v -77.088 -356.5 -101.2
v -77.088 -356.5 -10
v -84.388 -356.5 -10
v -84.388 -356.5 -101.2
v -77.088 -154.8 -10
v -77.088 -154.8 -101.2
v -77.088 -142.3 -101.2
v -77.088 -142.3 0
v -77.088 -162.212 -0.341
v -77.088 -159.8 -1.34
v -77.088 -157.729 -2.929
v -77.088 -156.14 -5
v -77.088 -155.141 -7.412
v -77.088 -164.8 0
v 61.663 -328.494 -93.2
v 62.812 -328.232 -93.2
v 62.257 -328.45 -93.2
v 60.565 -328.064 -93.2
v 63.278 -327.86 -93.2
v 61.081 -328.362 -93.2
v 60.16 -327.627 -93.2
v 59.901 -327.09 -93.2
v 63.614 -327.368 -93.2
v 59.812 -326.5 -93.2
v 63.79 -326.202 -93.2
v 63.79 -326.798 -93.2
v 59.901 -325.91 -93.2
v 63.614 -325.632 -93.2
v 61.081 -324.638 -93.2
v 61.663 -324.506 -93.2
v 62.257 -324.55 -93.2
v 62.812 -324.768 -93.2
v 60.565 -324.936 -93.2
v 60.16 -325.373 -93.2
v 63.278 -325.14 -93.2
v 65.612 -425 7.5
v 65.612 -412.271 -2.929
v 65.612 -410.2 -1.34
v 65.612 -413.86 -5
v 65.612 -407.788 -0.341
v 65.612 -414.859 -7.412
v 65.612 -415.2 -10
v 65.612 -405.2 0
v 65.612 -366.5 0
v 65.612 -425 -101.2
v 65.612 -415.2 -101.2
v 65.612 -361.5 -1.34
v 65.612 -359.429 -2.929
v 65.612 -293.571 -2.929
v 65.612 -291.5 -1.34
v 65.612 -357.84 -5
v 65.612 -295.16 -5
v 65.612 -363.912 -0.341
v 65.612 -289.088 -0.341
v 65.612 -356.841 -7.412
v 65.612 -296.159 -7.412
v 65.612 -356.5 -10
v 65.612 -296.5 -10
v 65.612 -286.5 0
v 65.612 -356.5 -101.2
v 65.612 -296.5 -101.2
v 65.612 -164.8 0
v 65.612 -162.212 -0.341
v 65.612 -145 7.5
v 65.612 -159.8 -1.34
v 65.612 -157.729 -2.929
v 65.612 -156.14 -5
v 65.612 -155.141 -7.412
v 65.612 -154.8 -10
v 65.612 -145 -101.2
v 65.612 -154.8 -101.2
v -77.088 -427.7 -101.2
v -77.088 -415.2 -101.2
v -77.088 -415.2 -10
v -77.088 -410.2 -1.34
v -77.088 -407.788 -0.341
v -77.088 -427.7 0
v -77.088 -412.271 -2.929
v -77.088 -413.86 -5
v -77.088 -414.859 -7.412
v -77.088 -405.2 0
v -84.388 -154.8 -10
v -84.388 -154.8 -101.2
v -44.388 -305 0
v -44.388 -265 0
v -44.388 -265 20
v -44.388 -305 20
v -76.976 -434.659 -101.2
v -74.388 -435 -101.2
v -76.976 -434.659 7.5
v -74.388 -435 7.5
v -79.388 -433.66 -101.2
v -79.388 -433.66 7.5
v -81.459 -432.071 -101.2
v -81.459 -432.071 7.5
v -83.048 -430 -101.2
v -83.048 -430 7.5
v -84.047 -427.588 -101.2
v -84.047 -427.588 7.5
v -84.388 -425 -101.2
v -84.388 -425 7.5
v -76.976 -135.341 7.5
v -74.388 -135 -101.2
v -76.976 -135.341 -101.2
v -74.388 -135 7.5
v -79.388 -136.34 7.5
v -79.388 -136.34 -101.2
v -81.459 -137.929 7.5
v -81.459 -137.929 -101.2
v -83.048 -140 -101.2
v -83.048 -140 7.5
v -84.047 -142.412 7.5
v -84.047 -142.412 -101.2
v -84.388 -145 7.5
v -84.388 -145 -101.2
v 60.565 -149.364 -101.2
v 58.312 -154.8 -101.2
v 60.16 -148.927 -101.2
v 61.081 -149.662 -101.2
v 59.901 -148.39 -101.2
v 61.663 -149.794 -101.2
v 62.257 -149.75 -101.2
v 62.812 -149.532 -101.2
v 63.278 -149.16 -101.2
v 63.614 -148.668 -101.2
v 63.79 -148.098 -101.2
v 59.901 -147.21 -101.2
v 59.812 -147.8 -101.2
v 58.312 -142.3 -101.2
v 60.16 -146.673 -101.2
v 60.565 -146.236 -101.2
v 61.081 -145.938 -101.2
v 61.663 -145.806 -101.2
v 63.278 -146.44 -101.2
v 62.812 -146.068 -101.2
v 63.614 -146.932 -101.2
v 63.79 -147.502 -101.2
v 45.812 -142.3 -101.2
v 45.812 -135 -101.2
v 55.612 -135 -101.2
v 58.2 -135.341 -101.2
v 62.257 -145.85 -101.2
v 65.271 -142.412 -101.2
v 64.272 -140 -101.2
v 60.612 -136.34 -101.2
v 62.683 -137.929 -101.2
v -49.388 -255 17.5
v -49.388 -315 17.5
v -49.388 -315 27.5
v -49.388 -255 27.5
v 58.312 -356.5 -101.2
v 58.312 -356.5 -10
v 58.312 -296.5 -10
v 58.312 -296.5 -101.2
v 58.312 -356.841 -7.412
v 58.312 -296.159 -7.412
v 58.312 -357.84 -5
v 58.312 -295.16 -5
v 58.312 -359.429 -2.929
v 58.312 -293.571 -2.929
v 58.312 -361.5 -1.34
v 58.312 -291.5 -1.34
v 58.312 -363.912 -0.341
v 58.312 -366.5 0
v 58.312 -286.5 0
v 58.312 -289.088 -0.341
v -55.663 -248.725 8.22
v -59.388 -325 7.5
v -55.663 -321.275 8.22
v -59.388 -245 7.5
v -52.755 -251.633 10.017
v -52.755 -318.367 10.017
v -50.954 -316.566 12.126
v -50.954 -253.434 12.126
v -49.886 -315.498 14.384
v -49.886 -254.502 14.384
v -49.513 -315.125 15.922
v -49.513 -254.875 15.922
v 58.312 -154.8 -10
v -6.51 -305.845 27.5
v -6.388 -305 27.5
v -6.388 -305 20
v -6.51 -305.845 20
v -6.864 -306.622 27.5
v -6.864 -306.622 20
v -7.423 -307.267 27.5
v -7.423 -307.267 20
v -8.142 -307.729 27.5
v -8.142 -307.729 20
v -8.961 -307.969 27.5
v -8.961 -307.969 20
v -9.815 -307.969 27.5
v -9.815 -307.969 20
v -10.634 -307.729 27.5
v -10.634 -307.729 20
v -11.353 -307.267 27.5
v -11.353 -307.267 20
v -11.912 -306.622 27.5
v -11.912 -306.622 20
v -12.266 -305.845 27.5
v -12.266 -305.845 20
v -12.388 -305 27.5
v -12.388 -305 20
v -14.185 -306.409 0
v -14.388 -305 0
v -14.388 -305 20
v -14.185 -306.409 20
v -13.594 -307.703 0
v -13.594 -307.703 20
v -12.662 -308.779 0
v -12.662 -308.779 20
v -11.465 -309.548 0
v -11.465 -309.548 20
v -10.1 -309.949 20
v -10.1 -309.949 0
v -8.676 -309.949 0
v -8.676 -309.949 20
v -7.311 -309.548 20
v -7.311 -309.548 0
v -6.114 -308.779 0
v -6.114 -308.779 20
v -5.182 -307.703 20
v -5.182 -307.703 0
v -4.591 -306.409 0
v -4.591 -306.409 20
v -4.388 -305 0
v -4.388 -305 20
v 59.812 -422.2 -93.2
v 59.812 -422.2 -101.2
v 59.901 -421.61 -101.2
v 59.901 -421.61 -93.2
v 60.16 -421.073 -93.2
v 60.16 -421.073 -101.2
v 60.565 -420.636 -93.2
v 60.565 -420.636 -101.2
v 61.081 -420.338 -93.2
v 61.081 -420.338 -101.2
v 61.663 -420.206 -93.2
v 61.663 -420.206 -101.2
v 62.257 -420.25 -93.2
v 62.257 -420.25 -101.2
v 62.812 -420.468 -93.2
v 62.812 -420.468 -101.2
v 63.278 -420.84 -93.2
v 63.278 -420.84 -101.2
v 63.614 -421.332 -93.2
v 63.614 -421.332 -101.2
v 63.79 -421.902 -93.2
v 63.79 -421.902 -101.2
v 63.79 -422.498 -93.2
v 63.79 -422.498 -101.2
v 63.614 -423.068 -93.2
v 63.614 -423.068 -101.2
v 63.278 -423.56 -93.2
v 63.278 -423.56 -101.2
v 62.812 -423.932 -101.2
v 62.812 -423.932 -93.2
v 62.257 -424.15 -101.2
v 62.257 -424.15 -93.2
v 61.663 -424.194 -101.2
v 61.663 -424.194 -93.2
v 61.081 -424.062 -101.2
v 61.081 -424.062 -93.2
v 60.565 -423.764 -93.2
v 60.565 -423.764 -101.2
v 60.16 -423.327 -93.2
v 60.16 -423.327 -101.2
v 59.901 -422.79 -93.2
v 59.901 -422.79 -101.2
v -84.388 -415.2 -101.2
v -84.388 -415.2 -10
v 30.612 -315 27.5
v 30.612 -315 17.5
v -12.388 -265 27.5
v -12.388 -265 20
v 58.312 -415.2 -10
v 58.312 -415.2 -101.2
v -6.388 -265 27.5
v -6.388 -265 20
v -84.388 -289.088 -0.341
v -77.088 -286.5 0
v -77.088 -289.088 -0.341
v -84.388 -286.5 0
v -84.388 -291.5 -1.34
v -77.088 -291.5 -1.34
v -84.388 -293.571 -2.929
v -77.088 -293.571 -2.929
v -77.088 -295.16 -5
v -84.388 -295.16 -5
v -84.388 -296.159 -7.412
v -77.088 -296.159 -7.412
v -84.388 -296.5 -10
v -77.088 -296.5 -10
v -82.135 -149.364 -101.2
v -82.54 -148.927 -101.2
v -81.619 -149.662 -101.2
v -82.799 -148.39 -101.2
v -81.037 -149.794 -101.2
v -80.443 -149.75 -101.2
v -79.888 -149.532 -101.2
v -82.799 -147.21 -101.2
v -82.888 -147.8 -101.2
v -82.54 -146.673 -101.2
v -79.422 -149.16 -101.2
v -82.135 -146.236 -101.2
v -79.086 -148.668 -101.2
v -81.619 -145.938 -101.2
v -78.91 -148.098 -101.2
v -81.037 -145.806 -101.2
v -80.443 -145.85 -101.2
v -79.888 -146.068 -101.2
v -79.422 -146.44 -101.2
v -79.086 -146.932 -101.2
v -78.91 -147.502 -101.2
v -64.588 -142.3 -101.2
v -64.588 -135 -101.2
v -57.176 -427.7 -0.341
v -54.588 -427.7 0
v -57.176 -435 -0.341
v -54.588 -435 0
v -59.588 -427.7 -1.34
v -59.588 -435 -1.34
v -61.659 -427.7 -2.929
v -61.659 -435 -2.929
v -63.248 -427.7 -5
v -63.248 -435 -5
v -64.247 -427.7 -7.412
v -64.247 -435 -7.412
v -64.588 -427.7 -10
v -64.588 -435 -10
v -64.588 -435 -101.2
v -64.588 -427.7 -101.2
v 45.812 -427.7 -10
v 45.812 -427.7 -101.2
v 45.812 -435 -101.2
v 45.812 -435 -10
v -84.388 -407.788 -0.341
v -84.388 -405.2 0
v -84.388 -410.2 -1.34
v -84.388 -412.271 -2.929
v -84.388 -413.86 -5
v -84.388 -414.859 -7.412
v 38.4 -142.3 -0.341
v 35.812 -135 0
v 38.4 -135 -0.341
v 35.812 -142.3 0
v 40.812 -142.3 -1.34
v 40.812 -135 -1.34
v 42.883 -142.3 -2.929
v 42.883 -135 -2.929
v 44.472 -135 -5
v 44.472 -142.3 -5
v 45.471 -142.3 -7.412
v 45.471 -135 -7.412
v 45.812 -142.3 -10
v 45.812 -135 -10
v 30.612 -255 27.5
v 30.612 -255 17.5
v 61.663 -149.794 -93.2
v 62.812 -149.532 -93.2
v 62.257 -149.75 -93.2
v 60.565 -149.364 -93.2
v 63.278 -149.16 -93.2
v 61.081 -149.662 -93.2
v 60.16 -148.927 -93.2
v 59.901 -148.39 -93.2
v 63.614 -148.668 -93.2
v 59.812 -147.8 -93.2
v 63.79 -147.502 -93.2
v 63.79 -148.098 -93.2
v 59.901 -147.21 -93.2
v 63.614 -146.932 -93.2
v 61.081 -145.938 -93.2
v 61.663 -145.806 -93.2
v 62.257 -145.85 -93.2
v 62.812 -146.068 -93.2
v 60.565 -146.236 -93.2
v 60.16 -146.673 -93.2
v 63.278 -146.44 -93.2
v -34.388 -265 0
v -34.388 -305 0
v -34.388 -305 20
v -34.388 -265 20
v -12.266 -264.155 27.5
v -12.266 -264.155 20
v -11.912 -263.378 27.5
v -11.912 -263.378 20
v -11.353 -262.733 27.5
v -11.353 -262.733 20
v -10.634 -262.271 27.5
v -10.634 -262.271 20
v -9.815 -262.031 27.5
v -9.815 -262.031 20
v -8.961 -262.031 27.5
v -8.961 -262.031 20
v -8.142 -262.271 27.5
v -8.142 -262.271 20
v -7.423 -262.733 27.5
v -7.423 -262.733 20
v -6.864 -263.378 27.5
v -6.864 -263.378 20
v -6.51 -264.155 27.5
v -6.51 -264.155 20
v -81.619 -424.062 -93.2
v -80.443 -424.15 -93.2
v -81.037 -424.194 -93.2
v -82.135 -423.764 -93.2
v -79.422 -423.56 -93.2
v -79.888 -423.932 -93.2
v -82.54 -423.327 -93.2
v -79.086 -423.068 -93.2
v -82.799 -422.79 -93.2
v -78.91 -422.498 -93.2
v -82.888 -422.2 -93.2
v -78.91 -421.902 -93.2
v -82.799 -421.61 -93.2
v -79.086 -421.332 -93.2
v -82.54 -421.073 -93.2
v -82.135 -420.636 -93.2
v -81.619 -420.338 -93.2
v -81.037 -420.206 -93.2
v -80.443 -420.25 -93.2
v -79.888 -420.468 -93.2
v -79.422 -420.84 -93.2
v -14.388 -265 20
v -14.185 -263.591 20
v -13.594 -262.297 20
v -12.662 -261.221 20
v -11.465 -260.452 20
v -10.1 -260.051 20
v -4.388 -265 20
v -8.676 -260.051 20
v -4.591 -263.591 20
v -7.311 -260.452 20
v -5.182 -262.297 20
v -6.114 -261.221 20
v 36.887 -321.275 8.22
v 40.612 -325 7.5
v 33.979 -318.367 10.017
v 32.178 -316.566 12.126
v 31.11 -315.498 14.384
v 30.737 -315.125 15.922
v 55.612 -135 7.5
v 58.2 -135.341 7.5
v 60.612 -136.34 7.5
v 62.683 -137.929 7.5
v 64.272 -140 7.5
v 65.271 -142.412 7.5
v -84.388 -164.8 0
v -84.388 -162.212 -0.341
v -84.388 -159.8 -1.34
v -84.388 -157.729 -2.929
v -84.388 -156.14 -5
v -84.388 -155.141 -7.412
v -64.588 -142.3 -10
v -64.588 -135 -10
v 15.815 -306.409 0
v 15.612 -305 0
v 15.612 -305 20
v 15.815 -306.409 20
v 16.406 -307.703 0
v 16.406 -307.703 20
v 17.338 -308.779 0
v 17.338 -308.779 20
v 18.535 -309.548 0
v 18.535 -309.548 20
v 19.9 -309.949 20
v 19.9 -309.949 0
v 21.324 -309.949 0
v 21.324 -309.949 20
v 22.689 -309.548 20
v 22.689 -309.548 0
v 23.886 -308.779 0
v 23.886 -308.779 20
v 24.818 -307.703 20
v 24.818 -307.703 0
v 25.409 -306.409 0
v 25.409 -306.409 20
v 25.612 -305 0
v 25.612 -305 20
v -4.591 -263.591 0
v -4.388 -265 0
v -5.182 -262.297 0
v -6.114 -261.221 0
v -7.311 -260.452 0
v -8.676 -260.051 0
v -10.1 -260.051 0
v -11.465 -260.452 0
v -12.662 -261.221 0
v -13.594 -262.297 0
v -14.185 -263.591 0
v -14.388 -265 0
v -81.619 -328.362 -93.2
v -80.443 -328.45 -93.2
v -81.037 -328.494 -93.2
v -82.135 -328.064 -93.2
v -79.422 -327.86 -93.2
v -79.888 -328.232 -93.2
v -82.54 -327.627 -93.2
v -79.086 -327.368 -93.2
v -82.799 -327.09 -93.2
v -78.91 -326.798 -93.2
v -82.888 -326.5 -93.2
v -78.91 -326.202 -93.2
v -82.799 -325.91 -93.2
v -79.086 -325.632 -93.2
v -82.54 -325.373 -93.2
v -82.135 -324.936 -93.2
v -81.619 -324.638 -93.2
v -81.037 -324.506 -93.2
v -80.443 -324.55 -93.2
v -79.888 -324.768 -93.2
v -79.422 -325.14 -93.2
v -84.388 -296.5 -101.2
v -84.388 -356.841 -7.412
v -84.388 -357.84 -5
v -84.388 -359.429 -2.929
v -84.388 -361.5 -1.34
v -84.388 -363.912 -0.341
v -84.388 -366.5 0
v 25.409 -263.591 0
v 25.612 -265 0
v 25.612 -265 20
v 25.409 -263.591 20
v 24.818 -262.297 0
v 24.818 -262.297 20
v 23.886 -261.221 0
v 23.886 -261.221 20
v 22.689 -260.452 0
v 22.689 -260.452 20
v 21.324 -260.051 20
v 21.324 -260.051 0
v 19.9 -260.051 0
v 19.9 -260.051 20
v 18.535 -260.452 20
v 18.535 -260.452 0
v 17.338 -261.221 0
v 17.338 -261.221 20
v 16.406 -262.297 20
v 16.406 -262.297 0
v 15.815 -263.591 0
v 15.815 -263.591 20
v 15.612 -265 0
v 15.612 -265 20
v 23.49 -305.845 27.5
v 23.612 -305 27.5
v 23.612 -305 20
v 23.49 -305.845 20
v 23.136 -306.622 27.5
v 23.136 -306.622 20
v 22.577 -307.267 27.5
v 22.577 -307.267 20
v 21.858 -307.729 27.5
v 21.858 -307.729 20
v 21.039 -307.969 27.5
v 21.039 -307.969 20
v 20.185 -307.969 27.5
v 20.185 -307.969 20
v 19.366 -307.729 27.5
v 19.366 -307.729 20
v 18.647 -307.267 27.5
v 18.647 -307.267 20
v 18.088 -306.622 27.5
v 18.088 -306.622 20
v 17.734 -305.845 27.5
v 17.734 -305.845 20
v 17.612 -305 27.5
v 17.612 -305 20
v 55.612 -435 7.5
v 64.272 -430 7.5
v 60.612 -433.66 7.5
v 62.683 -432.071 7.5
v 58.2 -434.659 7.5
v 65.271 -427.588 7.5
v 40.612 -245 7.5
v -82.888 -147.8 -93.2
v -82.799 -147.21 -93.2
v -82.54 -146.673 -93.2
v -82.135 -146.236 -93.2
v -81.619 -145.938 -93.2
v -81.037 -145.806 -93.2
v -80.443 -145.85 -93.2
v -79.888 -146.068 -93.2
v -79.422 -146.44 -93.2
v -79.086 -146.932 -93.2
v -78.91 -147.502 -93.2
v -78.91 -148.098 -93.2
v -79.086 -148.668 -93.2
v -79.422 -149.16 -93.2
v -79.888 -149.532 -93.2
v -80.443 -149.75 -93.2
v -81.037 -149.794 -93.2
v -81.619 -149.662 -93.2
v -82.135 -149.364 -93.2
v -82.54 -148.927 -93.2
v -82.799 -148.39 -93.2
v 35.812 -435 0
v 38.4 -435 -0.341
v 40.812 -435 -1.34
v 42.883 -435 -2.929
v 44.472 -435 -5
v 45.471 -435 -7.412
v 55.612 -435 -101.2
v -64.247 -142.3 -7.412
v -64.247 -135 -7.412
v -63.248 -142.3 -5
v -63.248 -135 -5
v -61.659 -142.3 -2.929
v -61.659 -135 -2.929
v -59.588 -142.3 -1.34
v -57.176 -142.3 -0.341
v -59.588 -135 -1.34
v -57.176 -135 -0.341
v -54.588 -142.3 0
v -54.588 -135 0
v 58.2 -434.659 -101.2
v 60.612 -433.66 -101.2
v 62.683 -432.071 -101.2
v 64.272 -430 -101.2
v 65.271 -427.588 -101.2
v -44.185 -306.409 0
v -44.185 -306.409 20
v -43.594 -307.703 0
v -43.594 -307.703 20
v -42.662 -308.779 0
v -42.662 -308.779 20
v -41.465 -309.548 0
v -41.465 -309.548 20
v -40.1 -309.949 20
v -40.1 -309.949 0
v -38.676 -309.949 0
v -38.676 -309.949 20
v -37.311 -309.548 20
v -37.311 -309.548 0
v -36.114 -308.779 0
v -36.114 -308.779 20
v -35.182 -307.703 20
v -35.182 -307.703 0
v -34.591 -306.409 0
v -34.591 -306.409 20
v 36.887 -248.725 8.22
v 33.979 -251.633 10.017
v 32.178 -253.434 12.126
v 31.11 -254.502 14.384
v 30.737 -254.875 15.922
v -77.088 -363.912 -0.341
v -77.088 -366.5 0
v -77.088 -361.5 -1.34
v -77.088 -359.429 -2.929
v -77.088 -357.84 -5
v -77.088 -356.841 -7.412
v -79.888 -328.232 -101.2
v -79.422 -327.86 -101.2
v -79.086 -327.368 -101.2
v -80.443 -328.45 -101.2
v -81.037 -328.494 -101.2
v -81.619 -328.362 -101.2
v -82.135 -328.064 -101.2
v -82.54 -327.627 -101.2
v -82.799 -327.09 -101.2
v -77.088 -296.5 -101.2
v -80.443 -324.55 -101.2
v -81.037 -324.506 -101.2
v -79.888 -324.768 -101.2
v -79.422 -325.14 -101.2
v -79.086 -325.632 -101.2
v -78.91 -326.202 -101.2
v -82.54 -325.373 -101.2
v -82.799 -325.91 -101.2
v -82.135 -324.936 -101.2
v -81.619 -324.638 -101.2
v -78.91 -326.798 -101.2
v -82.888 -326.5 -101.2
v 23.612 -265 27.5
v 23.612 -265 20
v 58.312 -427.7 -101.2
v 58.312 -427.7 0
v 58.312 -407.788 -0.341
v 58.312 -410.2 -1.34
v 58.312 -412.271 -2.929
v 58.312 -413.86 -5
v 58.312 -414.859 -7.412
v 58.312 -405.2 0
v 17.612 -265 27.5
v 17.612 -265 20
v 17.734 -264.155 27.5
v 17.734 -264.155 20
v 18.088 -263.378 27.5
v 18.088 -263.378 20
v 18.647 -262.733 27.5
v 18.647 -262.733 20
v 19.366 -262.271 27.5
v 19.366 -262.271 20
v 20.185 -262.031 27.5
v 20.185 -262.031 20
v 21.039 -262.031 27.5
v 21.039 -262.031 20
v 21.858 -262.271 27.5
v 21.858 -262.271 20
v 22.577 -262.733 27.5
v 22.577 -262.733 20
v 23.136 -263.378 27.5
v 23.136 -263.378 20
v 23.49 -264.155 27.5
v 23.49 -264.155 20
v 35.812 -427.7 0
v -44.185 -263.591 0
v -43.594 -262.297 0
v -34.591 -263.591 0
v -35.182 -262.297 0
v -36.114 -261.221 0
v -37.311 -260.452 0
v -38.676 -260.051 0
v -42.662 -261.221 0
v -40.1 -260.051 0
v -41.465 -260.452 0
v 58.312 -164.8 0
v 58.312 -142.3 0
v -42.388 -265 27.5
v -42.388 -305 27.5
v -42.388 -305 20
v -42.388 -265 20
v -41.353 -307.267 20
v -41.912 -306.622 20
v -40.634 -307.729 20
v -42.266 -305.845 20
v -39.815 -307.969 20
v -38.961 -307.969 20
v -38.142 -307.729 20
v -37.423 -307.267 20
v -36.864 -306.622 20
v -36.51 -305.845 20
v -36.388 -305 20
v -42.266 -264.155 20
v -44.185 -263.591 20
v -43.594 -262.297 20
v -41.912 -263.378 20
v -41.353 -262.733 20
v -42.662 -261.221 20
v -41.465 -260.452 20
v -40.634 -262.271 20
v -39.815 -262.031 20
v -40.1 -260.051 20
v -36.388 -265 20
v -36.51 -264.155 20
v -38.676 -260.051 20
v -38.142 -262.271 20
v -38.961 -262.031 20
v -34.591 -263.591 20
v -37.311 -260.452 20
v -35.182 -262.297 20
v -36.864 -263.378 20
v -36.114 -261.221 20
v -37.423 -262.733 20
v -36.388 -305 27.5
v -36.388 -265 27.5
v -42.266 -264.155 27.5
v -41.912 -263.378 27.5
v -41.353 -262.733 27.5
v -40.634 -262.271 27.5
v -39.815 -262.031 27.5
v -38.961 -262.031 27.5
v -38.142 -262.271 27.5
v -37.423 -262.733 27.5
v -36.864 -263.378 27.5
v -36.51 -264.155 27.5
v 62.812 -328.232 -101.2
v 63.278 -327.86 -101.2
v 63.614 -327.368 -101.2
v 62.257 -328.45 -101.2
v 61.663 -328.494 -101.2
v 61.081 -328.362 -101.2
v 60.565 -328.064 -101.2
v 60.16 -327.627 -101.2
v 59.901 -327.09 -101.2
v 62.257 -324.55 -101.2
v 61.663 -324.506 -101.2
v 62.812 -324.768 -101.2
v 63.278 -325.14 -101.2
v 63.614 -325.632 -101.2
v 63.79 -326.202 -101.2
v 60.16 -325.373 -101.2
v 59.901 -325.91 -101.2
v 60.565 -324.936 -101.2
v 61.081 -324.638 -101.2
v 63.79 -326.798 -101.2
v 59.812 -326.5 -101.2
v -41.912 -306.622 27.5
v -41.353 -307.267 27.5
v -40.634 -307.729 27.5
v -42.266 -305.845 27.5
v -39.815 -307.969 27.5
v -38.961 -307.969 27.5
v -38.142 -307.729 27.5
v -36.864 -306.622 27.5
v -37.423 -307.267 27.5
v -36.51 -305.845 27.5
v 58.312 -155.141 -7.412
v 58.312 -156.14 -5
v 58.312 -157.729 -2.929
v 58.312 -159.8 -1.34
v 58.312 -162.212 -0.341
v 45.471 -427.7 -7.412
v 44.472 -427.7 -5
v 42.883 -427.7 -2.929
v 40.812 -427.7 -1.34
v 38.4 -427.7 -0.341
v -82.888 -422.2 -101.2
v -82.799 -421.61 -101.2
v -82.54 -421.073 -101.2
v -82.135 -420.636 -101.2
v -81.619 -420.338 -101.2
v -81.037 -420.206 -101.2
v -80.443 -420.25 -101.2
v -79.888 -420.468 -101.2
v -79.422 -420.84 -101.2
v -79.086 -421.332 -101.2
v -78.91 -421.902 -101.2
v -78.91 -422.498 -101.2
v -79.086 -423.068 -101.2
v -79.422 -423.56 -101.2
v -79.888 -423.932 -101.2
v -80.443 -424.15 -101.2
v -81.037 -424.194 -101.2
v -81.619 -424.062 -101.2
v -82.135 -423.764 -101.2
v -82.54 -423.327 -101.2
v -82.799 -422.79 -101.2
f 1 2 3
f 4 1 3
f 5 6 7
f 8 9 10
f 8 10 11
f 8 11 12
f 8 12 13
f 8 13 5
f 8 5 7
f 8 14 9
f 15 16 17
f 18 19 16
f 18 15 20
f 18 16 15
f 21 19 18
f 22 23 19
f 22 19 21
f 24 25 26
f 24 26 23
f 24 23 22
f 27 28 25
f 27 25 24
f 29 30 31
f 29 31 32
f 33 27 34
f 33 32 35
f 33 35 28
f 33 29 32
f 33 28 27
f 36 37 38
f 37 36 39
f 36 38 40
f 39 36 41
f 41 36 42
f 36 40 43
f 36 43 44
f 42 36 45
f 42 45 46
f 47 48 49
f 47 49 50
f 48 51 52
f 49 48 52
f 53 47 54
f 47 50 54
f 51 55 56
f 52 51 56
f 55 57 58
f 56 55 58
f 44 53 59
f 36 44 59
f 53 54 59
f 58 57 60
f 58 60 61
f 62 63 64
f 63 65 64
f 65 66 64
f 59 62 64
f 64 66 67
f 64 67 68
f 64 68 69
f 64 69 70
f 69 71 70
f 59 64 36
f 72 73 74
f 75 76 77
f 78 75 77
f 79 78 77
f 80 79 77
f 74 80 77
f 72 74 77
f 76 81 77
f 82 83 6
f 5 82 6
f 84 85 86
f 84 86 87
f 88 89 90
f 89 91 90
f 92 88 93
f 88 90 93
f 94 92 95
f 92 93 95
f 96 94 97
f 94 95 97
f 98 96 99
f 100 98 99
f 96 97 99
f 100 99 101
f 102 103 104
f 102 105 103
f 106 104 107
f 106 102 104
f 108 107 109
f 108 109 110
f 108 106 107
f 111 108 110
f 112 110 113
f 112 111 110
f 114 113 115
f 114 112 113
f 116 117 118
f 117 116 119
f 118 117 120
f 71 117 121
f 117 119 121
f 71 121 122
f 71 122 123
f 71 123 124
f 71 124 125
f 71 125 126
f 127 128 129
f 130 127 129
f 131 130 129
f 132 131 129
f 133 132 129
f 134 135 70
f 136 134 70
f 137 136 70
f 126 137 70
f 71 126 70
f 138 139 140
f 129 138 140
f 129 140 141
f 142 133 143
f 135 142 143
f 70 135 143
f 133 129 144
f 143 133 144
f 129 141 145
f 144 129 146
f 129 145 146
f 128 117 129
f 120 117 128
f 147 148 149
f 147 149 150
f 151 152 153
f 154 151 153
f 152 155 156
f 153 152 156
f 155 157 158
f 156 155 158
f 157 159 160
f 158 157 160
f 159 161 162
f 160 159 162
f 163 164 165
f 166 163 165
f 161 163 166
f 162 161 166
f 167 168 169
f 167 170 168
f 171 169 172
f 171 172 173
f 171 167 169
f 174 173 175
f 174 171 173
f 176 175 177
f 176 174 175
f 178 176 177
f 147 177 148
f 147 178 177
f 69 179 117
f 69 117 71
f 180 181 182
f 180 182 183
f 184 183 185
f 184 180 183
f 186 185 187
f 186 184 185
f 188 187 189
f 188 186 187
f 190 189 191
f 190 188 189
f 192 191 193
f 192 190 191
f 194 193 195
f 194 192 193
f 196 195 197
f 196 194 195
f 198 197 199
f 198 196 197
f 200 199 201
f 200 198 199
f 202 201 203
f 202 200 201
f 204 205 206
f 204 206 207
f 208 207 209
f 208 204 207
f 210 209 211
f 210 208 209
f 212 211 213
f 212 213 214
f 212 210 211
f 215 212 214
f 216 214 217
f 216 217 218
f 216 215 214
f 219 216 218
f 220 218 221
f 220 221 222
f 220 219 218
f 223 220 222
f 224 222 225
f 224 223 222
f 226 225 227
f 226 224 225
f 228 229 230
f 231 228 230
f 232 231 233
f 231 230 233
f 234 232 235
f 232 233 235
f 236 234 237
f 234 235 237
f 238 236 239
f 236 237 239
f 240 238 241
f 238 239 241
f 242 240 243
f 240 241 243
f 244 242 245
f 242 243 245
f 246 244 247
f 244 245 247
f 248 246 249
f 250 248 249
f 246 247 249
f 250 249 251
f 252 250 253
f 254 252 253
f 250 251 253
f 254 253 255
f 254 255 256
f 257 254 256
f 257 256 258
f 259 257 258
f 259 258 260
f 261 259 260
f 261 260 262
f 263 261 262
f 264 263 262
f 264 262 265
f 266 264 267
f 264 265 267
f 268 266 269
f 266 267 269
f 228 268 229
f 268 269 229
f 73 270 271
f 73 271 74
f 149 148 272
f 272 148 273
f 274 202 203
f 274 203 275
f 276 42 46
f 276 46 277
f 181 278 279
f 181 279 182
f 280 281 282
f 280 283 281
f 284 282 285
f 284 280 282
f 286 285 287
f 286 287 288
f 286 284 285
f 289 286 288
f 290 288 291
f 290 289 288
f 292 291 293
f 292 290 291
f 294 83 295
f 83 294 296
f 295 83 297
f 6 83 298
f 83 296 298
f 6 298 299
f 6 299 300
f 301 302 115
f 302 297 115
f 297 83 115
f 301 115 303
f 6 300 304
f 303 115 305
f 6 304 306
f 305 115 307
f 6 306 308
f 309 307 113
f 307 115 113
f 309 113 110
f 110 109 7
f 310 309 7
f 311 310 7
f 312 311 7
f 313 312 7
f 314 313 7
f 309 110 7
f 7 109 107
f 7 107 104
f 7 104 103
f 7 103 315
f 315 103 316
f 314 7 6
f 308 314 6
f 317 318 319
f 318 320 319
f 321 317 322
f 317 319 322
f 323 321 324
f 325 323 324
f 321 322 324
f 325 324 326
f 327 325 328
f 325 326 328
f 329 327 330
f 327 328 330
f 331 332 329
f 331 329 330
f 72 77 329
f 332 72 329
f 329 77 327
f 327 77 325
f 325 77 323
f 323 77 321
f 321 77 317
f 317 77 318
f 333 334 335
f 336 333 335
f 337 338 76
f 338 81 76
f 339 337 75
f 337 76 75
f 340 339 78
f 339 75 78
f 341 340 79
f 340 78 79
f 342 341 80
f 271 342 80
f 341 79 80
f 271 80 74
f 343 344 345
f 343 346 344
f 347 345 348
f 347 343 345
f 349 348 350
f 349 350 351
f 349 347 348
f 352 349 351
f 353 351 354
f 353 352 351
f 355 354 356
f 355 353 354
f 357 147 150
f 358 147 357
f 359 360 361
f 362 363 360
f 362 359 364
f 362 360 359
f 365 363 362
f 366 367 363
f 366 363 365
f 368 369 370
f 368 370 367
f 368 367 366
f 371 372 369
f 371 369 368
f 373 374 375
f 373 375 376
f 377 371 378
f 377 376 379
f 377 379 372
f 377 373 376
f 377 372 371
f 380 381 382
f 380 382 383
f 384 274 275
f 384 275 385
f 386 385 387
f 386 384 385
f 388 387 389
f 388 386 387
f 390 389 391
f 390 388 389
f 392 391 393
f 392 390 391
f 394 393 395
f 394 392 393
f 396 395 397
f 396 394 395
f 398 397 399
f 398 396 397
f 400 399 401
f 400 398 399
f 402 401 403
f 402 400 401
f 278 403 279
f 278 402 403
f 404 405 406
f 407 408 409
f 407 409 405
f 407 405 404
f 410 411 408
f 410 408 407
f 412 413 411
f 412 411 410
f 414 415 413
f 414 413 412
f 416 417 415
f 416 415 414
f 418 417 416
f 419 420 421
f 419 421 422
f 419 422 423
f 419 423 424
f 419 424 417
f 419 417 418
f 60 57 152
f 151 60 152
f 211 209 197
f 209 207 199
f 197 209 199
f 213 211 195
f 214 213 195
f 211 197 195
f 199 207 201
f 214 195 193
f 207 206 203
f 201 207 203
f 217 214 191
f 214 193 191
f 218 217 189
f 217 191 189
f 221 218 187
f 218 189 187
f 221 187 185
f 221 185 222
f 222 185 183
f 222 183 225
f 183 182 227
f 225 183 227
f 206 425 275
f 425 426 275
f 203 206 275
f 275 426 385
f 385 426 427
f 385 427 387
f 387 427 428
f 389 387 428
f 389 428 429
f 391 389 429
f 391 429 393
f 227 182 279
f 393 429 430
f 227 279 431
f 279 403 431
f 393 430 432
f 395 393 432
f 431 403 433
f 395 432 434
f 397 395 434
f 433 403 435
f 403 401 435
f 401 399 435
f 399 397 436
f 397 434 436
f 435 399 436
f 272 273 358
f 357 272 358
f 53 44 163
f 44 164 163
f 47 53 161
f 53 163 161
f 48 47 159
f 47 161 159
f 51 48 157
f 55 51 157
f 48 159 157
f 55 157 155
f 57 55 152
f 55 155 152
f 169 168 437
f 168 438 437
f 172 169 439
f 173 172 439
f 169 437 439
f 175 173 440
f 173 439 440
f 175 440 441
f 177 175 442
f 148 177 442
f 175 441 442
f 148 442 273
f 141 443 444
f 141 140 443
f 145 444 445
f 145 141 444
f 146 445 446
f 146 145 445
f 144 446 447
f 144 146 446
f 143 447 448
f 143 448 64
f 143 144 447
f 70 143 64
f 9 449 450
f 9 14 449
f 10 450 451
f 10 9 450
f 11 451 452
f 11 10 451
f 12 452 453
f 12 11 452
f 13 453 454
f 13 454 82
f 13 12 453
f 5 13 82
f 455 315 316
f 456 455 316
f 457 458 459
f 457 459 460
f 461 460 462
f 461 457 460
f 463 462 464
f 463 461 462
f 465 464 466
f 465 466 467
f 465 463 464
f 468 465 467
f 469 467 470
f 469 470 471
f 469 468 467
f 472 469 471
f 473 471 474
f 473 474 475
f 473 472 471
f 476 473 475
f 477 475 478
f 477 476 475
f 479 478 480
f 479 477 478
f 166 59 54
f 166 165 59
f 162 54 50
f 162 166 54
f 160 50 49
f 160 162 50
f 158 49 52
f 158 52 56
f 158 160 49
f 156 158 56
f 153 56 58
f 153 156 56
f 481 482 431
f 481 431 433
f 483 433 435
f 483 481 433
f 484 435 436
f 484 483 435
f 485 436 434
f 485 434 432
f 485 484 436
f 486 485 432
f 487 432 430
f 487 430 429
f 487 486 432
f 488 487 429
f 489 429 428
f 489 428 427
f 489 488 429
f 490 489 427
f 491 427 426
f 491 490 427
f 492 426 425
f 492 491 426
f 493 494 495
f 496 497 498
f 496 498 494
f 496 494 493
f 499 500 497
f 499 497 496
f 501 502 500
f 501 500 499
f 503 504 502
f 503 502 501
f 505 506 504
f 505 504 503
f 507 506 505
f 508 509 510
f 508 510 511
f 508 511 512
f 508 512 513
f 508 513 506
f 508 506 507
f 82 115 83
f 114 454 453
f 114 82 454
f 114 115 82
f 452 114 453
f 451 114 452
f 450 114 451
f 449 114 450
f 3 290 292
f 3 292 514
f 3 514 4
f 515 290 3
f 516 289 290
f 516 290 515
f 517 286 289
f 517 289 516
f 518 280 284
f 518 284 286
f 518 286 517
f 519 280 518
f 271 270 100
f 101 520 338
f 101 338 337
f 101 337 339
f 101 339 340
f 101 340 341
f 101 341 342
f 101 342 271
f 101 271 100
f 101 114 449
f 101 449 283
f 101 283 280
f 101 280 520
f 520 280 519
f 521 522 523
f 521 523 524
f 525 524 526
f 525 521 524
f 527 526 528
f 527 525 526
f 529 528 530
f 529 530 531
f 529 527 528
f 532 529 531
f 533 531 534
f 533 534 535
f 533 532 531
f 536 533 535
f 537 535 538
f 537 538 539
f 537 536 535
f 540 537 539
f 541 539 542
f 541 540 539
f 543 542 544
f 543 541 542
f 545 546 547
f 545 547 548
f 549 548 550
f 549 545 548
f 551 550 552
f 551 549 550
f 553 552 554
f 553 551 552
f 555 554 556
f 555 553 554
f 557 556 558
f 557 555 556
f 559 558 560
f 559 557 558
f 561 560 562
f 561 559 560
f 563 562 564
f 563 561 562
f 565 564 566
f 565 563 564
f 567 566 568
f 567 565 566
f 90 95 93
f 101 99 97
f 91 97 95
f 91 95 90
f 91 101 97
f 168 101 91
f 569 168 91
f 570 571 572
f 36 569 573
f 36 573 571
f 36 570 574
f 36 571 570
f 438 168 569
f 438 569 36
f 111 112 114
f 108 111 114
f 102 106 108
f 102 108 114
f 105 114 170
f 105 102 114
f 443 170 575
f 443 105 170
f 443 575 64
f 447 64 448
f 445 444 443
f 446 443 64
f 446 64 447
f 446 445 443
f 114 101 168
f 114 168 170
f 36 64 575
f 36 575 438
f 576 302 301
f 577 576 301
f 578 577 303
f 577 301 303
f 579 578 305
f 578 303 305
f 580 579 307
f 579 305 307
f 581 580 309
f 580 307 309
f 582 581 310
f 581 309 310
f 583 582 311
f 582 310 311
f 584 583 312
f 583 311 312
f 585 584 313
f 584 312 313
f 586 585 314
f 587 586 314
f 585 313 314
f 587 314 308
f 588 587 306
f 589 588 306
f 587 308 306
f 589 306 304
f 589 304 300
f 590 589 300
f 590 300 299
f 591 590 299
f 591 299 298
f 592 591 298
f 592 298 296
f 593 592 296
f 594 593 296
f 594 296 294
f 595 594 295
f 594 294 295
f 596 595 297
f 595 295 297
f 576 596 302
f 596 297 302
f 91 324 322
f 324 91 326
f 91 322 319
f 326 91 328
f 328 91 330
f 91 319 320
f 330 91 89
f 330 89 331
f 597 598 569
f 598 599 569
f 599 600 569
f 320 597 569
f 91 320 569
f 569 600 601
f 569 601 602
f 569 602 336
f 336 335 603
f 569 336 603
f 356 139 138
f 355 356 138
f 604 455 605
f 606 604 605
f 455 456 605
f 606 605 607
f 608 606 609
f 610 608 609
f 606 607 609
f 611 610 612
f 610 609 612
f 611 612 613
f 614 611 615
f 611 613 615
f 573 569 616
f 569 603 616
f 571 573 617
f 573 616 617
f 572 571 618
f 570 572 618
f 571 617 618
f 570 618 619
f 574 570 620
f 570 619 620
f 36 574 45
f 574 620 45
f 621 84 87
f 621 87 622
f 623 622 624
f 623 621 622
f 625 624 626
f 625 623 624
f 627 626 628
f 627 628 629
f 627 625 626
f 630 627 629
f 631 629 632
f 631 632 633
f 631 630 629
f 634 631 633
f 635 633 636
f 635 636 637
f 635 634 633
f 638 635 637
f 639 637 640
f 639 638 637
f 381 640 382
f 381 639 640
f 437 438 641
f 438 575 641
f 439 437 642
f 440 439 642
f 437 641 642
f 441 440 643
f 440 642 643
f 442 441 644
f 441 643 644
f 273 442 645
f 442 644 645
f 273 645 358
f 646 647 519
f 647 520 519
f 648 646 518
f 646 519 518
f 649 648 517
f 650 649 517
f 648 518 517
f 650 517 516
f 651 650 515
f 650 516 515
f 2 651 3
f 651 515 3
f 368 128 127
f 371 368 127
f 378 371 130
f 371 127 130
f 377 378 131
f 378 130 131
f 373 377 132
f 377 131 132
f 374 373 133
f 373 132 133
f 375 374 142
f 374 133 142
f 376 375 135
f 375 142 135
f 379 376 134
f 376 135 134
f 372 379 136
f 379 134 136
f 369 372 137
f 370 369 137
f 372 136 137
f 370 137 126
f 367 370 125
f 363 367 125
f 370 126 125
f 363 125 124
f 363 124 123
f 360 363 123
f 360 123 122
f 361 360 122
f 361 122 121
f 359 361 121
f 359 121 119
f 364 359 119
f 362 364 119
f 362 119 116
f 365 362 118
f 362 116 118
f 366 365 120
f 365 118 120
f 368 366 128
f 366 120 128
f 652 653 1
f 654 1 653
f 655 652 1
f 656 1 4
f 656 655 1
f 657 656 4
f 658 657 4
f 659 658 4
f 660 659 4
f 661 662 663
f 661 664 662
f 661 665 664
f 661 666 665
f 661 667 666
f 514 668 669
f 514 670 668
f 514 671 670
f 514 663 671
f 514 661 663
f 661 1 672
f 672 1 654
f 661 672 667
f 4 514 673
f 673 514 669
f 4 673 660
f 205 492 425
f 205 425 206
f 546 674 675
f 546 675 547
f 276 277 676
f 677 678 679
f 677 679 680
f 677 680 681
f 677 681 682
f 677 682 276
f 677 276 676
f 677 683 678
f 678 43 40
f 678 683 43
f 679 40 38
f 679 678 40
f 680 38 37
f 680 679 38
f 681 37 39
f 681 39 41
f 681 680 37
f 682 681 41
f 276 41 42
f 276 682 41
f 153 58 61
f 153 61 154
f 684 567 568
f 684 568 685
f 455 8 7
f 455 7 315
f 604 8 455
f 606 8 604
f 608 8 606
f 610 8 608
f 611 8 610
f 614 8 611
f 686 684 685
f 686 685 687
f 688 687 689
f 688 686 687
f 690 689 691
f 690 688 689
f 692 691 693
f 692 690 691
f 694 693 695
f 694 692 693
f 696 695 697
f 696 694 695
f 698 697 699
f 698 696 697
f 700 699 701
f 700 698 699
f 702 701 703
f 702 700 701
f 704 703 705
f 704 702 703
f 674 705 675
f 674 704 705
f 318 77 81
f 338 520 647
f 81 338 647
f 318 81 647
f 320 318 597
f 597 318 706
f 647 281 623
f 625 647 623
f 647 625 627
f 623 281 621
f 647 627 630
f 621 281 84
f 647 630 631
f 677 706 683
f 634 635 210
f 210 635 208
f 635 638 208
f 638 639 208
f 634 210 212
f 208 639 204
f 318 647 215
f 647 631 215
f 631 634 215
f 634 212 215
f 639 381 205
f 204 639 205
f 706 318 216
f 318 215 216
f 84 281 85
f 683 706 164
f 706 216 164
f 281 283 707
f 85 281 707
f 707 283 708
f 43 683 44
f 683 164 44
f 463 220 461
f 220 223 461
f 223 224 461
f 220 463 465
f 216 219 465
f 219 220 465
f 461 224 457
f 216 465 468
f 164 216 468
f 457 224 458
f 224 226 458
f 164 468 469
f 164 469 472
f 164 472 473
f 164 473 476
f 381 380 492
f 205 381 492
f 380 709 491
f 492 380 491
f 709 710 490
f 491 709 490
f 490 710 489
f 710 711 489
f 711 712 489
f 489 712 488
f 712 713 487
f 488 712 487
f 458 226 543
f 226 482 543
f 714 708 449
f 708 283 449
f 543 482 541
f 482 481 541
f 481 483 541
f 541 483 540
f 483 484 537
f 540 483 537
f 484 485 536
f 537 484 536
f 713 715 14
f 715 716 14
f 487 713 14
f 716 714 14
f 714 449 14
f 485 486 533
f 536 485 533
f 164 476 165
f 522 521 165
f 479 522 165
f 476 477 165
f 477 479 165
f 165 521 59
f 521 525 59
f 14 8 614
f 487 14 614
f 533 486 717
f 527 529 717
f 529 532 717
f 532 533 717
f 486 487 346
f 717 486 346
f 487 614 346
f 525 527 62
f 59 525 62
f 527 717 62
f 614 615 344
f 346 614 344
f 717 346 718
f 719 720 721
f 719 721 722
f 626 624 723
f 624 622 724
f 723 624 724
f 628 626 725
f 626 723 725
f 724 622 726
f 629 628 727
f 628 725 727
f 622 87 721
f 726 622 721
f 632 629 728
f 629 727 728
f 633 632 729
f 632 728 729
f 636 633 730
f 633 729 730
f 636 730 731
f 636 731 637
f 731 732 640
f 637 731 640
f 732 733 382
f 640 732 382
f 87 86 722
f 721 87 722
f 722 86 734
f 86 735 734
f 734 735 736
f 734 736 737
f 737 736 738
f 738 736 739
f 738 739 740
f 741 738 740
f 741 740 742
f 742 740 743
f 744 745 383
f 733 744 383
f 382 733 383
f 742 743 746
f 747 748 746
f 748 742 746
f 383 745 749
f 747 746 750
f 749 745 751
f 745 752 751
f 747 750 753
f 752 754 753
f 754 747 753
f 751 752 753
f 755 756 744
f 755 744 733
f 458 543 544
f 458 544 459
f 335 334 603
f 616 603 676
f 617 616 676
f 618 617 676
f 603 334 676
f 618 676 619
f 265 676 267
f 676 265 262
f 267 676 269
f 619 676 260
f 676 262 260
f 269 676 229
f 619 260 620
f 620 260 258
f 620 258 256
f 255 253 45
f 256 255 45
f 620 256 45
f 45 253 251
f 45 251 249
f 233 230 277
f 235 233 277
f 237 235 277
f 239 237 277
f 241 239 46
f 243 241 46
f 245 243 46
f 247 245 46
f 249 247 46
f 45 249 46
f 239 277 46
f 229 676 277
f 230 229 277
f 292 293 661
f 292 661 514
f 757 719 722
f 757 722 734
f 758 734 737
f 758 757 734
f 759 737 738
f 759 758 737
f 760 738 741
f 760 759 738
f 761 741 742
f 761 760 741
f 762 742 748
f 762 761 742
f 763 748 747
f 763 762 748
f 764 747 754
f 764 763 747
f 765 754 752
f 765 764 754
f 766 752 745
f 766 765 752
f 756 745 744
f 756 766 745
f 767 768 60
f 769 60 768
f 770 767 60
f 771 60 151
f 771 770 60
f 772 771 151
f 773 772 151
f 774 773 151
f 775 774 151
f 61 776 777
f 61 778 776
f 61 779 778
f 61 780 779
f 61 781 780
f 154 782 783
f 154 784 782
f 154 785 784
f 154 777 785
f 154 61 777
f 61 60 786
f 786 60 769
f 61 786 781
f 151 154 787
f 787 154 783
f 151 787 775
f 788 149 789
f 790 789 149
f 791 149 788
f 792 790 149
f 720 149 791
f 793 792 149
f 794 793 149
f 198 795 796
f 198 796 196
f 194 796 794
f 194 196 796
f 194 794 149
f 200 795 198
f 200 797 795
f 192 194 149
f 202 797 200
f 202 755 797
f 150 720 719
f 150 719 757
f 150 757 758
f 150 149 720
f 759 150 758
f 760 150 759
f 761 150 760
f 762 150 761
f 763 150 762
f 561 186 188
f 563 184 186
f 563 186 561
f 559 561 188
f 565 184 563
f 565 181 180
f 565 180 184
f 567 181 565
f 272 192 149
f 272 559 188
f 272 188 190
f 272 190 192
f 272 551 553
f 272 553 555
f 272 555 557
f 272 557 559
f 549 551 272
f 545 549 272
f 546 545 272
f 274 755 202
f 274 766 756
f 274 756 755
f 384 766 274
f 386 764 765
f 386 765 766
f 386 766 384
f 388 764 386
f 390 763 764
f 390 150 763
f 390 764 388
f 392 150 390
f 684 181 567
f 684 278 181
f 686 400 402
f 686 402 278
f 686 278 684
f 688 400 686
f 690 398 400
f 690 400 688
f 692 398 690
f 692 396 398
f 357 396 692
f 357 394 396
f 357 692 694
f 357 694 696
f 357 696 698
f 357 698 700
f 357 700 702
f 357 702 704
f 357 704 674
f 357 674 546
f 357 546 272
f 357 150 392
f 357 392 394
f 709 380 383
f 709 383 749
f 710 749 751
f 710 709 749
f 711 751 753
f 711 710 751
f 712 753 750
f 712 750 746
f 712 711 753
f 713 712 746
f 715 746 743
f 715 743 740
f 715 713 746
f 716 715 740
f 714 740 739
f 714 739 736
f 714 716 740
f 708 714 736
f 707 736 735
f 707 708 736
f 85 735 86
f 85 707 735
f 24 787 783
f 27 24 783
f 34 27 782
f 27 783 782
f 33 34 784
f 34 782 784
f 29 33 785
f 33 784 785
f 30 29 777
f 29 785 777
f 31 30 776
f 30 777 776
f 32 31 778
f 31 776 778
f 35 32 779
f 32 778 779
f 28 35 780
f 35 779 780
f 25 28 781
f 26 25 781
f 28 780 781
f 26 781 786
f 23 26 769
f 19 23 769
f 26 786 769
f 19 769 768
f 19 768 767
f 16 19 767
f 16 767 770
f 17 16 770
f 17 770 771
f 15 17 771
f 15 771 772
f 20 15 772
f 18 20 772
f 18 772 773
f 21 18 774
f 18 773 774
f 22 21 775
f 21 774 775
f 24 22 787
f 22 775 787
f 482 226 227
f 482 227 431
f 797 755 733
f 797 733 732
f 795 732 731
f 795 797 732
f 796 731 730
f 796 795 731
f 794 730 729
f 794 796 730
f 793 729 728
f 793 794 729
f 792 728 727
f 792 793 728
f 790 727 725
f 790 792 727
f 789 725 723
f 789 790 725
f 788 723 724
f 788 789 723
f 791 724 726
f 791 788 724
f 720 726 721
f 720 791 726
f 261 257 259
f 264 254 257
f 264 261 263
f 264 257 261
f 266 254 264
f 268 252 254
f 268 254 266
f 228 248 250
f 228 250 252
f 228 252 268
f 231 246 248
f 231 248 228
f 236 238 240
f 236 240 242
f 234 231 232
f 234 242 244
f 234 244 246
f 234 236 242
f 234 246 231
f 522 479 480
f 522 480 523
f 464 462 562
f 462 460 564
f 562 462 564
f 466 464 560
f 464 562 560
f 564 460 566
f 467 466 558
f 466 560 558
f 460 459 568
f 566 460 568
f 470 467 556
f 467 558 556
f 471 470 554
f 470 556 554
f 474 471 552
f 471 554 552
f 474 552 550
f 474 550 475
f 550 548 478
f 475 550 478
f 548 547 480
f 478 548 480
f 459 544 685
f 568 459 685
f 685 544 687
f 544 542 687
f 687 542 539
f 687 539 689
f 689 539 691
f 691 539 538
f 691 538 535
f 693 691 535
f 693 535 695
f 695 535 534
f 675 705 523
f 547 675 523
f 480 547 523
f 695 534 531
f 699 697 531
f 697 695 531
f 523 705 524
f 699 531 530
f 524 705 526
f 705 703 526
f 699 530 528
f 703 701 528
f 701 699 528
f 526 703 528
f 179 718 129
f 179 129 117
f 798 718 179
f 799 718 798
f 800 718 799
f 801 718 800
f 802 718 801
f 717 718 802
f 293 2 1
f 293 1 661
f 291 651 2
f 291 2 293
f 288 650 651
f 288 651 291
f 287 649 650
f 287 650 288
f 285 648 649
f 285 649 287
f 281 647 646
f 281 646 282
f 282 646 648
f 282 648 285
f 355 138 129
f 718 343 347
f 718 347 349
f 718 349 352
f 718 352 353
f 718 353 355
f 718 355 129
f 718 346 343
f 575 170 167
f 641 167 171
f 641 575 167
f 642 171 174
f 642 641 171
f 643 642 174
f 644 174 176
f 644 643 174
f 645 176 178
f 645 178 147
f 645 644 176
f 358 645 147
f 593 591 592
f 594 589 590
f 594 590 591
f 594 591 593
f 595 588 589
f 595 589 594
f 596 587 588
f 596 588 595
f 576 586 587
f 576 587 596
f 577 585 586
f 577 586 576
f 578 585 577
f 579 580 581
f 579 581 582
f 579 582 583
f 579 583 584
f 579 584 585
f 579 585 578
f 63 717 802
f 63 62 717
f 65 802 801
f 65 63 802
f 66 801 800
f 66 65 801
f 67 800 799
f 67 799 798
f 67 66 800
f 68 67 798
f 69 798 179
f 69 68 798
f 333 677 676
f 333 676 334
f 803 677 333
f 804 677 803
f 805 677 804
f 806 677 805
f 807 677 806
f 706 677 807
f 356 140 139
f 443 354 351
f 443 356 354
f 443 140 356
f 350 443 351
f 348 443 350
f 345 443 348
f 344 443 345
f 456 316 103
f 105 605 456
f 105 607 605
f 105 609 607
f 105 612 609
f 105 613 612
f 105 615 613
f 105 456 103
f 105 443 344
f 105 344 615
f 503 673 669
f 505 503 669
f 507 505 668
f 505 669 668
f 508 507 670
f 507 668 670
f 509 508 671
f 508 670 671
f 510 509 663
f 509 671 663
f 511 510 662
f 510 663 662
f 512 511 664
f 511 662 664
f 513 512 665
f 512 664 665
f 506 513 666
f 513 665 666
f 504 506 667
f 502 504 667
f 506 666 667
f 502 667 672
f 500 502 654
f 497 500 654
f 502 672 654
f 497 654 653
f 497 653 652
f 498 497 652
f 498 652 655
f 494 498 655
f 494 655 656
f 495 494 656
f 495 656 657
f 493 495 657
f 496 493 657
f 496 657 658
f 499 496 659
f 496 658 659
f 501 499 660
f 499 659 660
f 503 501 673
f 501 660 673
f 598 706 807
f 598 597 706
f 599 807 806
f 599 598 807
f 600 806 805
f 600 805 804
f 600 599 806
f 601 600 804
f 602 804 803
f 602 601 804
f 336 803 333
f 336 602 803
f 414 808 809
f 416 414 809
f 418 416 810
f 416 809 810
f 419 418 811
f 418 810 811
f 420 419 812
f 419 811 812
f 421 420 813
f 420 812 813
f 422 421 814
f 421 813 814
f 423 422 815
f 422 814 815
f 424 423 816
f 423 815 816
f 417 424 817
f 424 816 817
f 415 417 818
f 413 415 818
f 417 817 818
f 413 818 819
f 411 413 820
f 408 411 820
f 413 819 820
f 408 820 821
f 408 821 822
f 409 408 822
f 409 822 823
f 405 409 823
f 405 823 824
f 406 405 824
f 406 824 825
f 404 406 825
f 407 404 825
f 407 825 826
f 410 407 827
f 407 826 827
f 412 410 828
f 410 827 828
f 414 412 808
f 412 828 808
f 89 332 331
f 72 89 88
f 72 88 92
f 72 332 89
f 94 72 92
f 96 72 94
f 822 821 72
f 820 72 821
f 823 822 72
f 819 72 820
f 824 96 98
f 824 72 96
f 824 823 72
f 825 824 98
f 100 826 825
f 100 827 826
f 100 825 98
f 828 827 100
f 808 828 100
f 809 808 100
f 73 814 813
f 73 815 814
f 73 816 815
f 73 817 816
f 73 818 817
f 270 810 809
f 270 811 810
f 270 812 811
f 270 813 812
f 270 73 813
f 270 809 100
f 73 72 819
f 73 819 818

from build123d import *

# Parameters (mm, degrees)
SKETCH2_W                 = 150
SKETCH2_H                 = 300
BOXPLATFORM_DEPTH         = 7.5
SKETCH3_W                 = 80
SKETCH3_H                 = 60
EXTRUSIONCONNECTION_DEPTH = 20
FILLET1_R                 = 10
MOUNTSLOTS_DEPTH          = 444.962367113
WASHERSLOTS_DEPTH         = 20
SKETCH7_W                 = 7.3
SKETCH7_H                 = 60
WALLS_DEPTH               = 101.2
FILLET2_R                 = 10
FILLET3_R                 = 10
SKETCH8_R                 = 2
M3X7MMHOLES_DEPTH         = 8


with BuildPart() as part:
    # Sketch2 → BoxPlatform (new body)
    with BuildSketch(Plane.XY):
        with Locations((-9.387993296, -285)):
            Rectangle(SKETCH2_W, SKETCH2_H)
    extrude(amount=BOXPLATFORM_DEPTH)

    # Sketch3 → ExtrusionConnection (add)
    with BuildSketch(Plane.XY.offset(7.5)):
        with Locations((-9.387993296, -285)):
            Rectangle(SKETCH3_W, SKETCH3_H)
    extrude(amount=EXTRUSIONCONNECTION_DEPTH)

    # Fillet1
    fillet1_edges = [part.edges().sort_by_distance(p)[0] for p in [
        (-9.387993296, -315, 7.5),
        (30.612006704, -285, 7.5),
        (-9.387993296, -255, 7.5),
        (-49.387993296, -285, 7.5),
    ]]
    fillet(fillet1_edges, radius=FILLET1_R)

    # Sketch5 → MountSlots (cut, through all)
    with BuildSketch(Plane.XY.offset(27.5)):
        with BuildLine():
            Line((17.612006704, -305), (17.612006704, -265))
            ThreePointArc((17.612006704, -265), (20.612006704, -262), (23.612006704, -265))
            Line((23.612006704, -265), (23.612006704, -305))
            ThreePointArc((23.612006704, -305), (20.612006704, -308), (17.612006704, -305))
        make_face()
        with BuildLine():
            Line((-42.387993296, -305), (-42.387993296, -265))
            ThreePointArc((-42.387993296, -265), (-39.387993296, -262), (-36.387993296, -265))
            Line((-36.387993296, -265), (-36.387993296, -305))
            ThreePointArc((-36.387993296, -305), (-39.387993296, -308), (-42.387993296, -305))
        make_face()
        with BuildLine():
            Line((-12.387993296, -305), (-12.387993296, -265))
            ThreePointArc((-12.387993296, -265), (-9.387993296, -262), (-6.387993296, -265))
            Line((-6.387993296, -265), (-6.387993296, -305))
            ThreePointArc((-6.387993296, -305), (-9.387993296, -308), (-12.387993296, -305))
        make_face()
    extrude(amount=-MOUNTSLOTS_DEPTH, mode=Mode.SUBTRACT)

    # Sketch6 → WasherSlots (cut)
    with BuildSketch(Plane(origin=(0, 0, 0), x_dir=(-1, 0, 0), z_dir=(0, 0, -1))):
        with BuildLine():
            Line((-15.612006704, -265), (-15.612006704, -305))
            ThreePointArc((-15.612006704, -305), (-20.612006704, -310), (-25.612006704, -305))
            Line((-25.612006704, -305), (-25.612006704, -265))
            ThreePointArc((-25.612006704, -265), (-20.612006704, -260), (-15.612006704, -265))
        make_face()
        with BuildLine():
            Line((14.387993296, -265), (14.387993296, -305))
            ThreePointArc((14.387993296, -305), (9.387993296, -310), (4.387993296, -305))
            Line((4.387993296, -305), (4.387993296, -265))
            ThreePointArc((4.387993296, -265), (9.387993296, -260), (14.387993296, -265))
        make_face()
        with BuildLine():
            Line((44.387993296, -265), (44.387993296, -305))
            ThreePointArc((44.387993296, -305), (39.387993296, -310), (34.387993296, -305))
            Line((34.387993296, -305), (34.387993296, -265))
            ThreePointArc((34.387993296, -265), (39.387993296, -260), (44.387993296, -265))
        make_face()
    extrude(amount=-WASHERSLOTS_DEPTH, mode=Mode.SUBTRACT)

    # Sketch7 → Walls (add)
    with BuildSketch(Plane(origin=(0, 0, 0), x_dir=(-1, 0, 0), z_dir=(0, 0, -1))):
        Polygon((64.587993296, -135), (84.387993296, -135), (84.387993296, -154.8), (77.087993296, -154.8), (77.087993296, -142.3), (64.587993296, -142.3), align=None)
        Polygon((84.387993296, -435), (84.387993296, -415.2), (77.087993296, -415.2), (77.087993296, -427.7), (64.587993296, -427.7), (64.587993296, -435), align=None)
        Polygon((-45.812006704, -142.3), (-58.312006704, -142.3), (-58.312006704, -154.8), (-65.612006704, -154.8), (-65.612006704, -135), (-45.812006704, -135), align=None)
        Polygon((-65.612006704, -435), (-65.612006704, -415.2), (-58.312006704, -415.2), (-58.312006704, -427.7), (-45.812006704, -427.7), (-45.812006704, -435), align=None)
        with Locations((-61.962006704, -326.5)):
            Rectangle(SKETCH7_W, SKETCH7_H)
        with Locations((80.737993296, -326.5)):
            Rectangle(SKETCH7_W, SKETCH7_H)
    extrude(amount=WALLS_DEPTH)

    # Fillet2
    fillet2_edges = [part.edges().sort_by_distance(p)[0] for p in [
        (65.612006704, -435, -46.85),
        (-84.387993296, -435, -46.85),
        (-84.387993296, -135, -46.85),
        (65.612006704, -135, -46.85),
    ]]
    fillet(fillet2_edges, radius=FILLET2_R)

    # Fillet3
    fillet3_edges = [part.edges().sort_by_distance(p)[0] for p in [
        (-64.587993296, -138.65, 0),
        (-80.737993296, -154.8, 0),
        (-80.737993296, -415.2, 0),
        (-64.587993296, -431.35, 0),
        (61.962006704, -154.8, 0),
        (45.812006704, -138.65, 0),
        (61.962006704, -415.2, 0),
        (45.812006704, -431.35, 0),
        (61.962006704, -356.5, 0),
        (61.962006704, -296.5, 0),
        (-80.737993296, -296.5, 0),
        (-80.737993296, -356.5, 0),
    ]]
    fillet(fillet3_edges, radius=FILLET3_R)

    # Sketch8 → M3x7mmHoles (cut)
    with BuildSketch(Plane(origin=(0, 0, -101.2), x_dir=(-1, 0, 0), z_dir=(0, 0, -1))):
        with Locations((80.887993296, -147.8)):
            Circle(SKETCH8_R)
        with Locations((-61.812006704, -147.8)):
            Circle(SKETCH8_R)
        with Locations((80.887993296, -326.5)):
            Circle(SKETCH8_R)
        with Locations((-61.812006704, -326.5)):
            Circle(SKETCH8_R)
        with Locations((80.887993296, -422.2)):
            Circle(SKETCH8_R)
        with Locations((-61.812006704, -422.2)):
            Circle(SKETCH8_R)
    extrude(amount=-M3X7MMHOLES_DEPTH, mode=Mode.SUBTRACT)


solid = part.part
